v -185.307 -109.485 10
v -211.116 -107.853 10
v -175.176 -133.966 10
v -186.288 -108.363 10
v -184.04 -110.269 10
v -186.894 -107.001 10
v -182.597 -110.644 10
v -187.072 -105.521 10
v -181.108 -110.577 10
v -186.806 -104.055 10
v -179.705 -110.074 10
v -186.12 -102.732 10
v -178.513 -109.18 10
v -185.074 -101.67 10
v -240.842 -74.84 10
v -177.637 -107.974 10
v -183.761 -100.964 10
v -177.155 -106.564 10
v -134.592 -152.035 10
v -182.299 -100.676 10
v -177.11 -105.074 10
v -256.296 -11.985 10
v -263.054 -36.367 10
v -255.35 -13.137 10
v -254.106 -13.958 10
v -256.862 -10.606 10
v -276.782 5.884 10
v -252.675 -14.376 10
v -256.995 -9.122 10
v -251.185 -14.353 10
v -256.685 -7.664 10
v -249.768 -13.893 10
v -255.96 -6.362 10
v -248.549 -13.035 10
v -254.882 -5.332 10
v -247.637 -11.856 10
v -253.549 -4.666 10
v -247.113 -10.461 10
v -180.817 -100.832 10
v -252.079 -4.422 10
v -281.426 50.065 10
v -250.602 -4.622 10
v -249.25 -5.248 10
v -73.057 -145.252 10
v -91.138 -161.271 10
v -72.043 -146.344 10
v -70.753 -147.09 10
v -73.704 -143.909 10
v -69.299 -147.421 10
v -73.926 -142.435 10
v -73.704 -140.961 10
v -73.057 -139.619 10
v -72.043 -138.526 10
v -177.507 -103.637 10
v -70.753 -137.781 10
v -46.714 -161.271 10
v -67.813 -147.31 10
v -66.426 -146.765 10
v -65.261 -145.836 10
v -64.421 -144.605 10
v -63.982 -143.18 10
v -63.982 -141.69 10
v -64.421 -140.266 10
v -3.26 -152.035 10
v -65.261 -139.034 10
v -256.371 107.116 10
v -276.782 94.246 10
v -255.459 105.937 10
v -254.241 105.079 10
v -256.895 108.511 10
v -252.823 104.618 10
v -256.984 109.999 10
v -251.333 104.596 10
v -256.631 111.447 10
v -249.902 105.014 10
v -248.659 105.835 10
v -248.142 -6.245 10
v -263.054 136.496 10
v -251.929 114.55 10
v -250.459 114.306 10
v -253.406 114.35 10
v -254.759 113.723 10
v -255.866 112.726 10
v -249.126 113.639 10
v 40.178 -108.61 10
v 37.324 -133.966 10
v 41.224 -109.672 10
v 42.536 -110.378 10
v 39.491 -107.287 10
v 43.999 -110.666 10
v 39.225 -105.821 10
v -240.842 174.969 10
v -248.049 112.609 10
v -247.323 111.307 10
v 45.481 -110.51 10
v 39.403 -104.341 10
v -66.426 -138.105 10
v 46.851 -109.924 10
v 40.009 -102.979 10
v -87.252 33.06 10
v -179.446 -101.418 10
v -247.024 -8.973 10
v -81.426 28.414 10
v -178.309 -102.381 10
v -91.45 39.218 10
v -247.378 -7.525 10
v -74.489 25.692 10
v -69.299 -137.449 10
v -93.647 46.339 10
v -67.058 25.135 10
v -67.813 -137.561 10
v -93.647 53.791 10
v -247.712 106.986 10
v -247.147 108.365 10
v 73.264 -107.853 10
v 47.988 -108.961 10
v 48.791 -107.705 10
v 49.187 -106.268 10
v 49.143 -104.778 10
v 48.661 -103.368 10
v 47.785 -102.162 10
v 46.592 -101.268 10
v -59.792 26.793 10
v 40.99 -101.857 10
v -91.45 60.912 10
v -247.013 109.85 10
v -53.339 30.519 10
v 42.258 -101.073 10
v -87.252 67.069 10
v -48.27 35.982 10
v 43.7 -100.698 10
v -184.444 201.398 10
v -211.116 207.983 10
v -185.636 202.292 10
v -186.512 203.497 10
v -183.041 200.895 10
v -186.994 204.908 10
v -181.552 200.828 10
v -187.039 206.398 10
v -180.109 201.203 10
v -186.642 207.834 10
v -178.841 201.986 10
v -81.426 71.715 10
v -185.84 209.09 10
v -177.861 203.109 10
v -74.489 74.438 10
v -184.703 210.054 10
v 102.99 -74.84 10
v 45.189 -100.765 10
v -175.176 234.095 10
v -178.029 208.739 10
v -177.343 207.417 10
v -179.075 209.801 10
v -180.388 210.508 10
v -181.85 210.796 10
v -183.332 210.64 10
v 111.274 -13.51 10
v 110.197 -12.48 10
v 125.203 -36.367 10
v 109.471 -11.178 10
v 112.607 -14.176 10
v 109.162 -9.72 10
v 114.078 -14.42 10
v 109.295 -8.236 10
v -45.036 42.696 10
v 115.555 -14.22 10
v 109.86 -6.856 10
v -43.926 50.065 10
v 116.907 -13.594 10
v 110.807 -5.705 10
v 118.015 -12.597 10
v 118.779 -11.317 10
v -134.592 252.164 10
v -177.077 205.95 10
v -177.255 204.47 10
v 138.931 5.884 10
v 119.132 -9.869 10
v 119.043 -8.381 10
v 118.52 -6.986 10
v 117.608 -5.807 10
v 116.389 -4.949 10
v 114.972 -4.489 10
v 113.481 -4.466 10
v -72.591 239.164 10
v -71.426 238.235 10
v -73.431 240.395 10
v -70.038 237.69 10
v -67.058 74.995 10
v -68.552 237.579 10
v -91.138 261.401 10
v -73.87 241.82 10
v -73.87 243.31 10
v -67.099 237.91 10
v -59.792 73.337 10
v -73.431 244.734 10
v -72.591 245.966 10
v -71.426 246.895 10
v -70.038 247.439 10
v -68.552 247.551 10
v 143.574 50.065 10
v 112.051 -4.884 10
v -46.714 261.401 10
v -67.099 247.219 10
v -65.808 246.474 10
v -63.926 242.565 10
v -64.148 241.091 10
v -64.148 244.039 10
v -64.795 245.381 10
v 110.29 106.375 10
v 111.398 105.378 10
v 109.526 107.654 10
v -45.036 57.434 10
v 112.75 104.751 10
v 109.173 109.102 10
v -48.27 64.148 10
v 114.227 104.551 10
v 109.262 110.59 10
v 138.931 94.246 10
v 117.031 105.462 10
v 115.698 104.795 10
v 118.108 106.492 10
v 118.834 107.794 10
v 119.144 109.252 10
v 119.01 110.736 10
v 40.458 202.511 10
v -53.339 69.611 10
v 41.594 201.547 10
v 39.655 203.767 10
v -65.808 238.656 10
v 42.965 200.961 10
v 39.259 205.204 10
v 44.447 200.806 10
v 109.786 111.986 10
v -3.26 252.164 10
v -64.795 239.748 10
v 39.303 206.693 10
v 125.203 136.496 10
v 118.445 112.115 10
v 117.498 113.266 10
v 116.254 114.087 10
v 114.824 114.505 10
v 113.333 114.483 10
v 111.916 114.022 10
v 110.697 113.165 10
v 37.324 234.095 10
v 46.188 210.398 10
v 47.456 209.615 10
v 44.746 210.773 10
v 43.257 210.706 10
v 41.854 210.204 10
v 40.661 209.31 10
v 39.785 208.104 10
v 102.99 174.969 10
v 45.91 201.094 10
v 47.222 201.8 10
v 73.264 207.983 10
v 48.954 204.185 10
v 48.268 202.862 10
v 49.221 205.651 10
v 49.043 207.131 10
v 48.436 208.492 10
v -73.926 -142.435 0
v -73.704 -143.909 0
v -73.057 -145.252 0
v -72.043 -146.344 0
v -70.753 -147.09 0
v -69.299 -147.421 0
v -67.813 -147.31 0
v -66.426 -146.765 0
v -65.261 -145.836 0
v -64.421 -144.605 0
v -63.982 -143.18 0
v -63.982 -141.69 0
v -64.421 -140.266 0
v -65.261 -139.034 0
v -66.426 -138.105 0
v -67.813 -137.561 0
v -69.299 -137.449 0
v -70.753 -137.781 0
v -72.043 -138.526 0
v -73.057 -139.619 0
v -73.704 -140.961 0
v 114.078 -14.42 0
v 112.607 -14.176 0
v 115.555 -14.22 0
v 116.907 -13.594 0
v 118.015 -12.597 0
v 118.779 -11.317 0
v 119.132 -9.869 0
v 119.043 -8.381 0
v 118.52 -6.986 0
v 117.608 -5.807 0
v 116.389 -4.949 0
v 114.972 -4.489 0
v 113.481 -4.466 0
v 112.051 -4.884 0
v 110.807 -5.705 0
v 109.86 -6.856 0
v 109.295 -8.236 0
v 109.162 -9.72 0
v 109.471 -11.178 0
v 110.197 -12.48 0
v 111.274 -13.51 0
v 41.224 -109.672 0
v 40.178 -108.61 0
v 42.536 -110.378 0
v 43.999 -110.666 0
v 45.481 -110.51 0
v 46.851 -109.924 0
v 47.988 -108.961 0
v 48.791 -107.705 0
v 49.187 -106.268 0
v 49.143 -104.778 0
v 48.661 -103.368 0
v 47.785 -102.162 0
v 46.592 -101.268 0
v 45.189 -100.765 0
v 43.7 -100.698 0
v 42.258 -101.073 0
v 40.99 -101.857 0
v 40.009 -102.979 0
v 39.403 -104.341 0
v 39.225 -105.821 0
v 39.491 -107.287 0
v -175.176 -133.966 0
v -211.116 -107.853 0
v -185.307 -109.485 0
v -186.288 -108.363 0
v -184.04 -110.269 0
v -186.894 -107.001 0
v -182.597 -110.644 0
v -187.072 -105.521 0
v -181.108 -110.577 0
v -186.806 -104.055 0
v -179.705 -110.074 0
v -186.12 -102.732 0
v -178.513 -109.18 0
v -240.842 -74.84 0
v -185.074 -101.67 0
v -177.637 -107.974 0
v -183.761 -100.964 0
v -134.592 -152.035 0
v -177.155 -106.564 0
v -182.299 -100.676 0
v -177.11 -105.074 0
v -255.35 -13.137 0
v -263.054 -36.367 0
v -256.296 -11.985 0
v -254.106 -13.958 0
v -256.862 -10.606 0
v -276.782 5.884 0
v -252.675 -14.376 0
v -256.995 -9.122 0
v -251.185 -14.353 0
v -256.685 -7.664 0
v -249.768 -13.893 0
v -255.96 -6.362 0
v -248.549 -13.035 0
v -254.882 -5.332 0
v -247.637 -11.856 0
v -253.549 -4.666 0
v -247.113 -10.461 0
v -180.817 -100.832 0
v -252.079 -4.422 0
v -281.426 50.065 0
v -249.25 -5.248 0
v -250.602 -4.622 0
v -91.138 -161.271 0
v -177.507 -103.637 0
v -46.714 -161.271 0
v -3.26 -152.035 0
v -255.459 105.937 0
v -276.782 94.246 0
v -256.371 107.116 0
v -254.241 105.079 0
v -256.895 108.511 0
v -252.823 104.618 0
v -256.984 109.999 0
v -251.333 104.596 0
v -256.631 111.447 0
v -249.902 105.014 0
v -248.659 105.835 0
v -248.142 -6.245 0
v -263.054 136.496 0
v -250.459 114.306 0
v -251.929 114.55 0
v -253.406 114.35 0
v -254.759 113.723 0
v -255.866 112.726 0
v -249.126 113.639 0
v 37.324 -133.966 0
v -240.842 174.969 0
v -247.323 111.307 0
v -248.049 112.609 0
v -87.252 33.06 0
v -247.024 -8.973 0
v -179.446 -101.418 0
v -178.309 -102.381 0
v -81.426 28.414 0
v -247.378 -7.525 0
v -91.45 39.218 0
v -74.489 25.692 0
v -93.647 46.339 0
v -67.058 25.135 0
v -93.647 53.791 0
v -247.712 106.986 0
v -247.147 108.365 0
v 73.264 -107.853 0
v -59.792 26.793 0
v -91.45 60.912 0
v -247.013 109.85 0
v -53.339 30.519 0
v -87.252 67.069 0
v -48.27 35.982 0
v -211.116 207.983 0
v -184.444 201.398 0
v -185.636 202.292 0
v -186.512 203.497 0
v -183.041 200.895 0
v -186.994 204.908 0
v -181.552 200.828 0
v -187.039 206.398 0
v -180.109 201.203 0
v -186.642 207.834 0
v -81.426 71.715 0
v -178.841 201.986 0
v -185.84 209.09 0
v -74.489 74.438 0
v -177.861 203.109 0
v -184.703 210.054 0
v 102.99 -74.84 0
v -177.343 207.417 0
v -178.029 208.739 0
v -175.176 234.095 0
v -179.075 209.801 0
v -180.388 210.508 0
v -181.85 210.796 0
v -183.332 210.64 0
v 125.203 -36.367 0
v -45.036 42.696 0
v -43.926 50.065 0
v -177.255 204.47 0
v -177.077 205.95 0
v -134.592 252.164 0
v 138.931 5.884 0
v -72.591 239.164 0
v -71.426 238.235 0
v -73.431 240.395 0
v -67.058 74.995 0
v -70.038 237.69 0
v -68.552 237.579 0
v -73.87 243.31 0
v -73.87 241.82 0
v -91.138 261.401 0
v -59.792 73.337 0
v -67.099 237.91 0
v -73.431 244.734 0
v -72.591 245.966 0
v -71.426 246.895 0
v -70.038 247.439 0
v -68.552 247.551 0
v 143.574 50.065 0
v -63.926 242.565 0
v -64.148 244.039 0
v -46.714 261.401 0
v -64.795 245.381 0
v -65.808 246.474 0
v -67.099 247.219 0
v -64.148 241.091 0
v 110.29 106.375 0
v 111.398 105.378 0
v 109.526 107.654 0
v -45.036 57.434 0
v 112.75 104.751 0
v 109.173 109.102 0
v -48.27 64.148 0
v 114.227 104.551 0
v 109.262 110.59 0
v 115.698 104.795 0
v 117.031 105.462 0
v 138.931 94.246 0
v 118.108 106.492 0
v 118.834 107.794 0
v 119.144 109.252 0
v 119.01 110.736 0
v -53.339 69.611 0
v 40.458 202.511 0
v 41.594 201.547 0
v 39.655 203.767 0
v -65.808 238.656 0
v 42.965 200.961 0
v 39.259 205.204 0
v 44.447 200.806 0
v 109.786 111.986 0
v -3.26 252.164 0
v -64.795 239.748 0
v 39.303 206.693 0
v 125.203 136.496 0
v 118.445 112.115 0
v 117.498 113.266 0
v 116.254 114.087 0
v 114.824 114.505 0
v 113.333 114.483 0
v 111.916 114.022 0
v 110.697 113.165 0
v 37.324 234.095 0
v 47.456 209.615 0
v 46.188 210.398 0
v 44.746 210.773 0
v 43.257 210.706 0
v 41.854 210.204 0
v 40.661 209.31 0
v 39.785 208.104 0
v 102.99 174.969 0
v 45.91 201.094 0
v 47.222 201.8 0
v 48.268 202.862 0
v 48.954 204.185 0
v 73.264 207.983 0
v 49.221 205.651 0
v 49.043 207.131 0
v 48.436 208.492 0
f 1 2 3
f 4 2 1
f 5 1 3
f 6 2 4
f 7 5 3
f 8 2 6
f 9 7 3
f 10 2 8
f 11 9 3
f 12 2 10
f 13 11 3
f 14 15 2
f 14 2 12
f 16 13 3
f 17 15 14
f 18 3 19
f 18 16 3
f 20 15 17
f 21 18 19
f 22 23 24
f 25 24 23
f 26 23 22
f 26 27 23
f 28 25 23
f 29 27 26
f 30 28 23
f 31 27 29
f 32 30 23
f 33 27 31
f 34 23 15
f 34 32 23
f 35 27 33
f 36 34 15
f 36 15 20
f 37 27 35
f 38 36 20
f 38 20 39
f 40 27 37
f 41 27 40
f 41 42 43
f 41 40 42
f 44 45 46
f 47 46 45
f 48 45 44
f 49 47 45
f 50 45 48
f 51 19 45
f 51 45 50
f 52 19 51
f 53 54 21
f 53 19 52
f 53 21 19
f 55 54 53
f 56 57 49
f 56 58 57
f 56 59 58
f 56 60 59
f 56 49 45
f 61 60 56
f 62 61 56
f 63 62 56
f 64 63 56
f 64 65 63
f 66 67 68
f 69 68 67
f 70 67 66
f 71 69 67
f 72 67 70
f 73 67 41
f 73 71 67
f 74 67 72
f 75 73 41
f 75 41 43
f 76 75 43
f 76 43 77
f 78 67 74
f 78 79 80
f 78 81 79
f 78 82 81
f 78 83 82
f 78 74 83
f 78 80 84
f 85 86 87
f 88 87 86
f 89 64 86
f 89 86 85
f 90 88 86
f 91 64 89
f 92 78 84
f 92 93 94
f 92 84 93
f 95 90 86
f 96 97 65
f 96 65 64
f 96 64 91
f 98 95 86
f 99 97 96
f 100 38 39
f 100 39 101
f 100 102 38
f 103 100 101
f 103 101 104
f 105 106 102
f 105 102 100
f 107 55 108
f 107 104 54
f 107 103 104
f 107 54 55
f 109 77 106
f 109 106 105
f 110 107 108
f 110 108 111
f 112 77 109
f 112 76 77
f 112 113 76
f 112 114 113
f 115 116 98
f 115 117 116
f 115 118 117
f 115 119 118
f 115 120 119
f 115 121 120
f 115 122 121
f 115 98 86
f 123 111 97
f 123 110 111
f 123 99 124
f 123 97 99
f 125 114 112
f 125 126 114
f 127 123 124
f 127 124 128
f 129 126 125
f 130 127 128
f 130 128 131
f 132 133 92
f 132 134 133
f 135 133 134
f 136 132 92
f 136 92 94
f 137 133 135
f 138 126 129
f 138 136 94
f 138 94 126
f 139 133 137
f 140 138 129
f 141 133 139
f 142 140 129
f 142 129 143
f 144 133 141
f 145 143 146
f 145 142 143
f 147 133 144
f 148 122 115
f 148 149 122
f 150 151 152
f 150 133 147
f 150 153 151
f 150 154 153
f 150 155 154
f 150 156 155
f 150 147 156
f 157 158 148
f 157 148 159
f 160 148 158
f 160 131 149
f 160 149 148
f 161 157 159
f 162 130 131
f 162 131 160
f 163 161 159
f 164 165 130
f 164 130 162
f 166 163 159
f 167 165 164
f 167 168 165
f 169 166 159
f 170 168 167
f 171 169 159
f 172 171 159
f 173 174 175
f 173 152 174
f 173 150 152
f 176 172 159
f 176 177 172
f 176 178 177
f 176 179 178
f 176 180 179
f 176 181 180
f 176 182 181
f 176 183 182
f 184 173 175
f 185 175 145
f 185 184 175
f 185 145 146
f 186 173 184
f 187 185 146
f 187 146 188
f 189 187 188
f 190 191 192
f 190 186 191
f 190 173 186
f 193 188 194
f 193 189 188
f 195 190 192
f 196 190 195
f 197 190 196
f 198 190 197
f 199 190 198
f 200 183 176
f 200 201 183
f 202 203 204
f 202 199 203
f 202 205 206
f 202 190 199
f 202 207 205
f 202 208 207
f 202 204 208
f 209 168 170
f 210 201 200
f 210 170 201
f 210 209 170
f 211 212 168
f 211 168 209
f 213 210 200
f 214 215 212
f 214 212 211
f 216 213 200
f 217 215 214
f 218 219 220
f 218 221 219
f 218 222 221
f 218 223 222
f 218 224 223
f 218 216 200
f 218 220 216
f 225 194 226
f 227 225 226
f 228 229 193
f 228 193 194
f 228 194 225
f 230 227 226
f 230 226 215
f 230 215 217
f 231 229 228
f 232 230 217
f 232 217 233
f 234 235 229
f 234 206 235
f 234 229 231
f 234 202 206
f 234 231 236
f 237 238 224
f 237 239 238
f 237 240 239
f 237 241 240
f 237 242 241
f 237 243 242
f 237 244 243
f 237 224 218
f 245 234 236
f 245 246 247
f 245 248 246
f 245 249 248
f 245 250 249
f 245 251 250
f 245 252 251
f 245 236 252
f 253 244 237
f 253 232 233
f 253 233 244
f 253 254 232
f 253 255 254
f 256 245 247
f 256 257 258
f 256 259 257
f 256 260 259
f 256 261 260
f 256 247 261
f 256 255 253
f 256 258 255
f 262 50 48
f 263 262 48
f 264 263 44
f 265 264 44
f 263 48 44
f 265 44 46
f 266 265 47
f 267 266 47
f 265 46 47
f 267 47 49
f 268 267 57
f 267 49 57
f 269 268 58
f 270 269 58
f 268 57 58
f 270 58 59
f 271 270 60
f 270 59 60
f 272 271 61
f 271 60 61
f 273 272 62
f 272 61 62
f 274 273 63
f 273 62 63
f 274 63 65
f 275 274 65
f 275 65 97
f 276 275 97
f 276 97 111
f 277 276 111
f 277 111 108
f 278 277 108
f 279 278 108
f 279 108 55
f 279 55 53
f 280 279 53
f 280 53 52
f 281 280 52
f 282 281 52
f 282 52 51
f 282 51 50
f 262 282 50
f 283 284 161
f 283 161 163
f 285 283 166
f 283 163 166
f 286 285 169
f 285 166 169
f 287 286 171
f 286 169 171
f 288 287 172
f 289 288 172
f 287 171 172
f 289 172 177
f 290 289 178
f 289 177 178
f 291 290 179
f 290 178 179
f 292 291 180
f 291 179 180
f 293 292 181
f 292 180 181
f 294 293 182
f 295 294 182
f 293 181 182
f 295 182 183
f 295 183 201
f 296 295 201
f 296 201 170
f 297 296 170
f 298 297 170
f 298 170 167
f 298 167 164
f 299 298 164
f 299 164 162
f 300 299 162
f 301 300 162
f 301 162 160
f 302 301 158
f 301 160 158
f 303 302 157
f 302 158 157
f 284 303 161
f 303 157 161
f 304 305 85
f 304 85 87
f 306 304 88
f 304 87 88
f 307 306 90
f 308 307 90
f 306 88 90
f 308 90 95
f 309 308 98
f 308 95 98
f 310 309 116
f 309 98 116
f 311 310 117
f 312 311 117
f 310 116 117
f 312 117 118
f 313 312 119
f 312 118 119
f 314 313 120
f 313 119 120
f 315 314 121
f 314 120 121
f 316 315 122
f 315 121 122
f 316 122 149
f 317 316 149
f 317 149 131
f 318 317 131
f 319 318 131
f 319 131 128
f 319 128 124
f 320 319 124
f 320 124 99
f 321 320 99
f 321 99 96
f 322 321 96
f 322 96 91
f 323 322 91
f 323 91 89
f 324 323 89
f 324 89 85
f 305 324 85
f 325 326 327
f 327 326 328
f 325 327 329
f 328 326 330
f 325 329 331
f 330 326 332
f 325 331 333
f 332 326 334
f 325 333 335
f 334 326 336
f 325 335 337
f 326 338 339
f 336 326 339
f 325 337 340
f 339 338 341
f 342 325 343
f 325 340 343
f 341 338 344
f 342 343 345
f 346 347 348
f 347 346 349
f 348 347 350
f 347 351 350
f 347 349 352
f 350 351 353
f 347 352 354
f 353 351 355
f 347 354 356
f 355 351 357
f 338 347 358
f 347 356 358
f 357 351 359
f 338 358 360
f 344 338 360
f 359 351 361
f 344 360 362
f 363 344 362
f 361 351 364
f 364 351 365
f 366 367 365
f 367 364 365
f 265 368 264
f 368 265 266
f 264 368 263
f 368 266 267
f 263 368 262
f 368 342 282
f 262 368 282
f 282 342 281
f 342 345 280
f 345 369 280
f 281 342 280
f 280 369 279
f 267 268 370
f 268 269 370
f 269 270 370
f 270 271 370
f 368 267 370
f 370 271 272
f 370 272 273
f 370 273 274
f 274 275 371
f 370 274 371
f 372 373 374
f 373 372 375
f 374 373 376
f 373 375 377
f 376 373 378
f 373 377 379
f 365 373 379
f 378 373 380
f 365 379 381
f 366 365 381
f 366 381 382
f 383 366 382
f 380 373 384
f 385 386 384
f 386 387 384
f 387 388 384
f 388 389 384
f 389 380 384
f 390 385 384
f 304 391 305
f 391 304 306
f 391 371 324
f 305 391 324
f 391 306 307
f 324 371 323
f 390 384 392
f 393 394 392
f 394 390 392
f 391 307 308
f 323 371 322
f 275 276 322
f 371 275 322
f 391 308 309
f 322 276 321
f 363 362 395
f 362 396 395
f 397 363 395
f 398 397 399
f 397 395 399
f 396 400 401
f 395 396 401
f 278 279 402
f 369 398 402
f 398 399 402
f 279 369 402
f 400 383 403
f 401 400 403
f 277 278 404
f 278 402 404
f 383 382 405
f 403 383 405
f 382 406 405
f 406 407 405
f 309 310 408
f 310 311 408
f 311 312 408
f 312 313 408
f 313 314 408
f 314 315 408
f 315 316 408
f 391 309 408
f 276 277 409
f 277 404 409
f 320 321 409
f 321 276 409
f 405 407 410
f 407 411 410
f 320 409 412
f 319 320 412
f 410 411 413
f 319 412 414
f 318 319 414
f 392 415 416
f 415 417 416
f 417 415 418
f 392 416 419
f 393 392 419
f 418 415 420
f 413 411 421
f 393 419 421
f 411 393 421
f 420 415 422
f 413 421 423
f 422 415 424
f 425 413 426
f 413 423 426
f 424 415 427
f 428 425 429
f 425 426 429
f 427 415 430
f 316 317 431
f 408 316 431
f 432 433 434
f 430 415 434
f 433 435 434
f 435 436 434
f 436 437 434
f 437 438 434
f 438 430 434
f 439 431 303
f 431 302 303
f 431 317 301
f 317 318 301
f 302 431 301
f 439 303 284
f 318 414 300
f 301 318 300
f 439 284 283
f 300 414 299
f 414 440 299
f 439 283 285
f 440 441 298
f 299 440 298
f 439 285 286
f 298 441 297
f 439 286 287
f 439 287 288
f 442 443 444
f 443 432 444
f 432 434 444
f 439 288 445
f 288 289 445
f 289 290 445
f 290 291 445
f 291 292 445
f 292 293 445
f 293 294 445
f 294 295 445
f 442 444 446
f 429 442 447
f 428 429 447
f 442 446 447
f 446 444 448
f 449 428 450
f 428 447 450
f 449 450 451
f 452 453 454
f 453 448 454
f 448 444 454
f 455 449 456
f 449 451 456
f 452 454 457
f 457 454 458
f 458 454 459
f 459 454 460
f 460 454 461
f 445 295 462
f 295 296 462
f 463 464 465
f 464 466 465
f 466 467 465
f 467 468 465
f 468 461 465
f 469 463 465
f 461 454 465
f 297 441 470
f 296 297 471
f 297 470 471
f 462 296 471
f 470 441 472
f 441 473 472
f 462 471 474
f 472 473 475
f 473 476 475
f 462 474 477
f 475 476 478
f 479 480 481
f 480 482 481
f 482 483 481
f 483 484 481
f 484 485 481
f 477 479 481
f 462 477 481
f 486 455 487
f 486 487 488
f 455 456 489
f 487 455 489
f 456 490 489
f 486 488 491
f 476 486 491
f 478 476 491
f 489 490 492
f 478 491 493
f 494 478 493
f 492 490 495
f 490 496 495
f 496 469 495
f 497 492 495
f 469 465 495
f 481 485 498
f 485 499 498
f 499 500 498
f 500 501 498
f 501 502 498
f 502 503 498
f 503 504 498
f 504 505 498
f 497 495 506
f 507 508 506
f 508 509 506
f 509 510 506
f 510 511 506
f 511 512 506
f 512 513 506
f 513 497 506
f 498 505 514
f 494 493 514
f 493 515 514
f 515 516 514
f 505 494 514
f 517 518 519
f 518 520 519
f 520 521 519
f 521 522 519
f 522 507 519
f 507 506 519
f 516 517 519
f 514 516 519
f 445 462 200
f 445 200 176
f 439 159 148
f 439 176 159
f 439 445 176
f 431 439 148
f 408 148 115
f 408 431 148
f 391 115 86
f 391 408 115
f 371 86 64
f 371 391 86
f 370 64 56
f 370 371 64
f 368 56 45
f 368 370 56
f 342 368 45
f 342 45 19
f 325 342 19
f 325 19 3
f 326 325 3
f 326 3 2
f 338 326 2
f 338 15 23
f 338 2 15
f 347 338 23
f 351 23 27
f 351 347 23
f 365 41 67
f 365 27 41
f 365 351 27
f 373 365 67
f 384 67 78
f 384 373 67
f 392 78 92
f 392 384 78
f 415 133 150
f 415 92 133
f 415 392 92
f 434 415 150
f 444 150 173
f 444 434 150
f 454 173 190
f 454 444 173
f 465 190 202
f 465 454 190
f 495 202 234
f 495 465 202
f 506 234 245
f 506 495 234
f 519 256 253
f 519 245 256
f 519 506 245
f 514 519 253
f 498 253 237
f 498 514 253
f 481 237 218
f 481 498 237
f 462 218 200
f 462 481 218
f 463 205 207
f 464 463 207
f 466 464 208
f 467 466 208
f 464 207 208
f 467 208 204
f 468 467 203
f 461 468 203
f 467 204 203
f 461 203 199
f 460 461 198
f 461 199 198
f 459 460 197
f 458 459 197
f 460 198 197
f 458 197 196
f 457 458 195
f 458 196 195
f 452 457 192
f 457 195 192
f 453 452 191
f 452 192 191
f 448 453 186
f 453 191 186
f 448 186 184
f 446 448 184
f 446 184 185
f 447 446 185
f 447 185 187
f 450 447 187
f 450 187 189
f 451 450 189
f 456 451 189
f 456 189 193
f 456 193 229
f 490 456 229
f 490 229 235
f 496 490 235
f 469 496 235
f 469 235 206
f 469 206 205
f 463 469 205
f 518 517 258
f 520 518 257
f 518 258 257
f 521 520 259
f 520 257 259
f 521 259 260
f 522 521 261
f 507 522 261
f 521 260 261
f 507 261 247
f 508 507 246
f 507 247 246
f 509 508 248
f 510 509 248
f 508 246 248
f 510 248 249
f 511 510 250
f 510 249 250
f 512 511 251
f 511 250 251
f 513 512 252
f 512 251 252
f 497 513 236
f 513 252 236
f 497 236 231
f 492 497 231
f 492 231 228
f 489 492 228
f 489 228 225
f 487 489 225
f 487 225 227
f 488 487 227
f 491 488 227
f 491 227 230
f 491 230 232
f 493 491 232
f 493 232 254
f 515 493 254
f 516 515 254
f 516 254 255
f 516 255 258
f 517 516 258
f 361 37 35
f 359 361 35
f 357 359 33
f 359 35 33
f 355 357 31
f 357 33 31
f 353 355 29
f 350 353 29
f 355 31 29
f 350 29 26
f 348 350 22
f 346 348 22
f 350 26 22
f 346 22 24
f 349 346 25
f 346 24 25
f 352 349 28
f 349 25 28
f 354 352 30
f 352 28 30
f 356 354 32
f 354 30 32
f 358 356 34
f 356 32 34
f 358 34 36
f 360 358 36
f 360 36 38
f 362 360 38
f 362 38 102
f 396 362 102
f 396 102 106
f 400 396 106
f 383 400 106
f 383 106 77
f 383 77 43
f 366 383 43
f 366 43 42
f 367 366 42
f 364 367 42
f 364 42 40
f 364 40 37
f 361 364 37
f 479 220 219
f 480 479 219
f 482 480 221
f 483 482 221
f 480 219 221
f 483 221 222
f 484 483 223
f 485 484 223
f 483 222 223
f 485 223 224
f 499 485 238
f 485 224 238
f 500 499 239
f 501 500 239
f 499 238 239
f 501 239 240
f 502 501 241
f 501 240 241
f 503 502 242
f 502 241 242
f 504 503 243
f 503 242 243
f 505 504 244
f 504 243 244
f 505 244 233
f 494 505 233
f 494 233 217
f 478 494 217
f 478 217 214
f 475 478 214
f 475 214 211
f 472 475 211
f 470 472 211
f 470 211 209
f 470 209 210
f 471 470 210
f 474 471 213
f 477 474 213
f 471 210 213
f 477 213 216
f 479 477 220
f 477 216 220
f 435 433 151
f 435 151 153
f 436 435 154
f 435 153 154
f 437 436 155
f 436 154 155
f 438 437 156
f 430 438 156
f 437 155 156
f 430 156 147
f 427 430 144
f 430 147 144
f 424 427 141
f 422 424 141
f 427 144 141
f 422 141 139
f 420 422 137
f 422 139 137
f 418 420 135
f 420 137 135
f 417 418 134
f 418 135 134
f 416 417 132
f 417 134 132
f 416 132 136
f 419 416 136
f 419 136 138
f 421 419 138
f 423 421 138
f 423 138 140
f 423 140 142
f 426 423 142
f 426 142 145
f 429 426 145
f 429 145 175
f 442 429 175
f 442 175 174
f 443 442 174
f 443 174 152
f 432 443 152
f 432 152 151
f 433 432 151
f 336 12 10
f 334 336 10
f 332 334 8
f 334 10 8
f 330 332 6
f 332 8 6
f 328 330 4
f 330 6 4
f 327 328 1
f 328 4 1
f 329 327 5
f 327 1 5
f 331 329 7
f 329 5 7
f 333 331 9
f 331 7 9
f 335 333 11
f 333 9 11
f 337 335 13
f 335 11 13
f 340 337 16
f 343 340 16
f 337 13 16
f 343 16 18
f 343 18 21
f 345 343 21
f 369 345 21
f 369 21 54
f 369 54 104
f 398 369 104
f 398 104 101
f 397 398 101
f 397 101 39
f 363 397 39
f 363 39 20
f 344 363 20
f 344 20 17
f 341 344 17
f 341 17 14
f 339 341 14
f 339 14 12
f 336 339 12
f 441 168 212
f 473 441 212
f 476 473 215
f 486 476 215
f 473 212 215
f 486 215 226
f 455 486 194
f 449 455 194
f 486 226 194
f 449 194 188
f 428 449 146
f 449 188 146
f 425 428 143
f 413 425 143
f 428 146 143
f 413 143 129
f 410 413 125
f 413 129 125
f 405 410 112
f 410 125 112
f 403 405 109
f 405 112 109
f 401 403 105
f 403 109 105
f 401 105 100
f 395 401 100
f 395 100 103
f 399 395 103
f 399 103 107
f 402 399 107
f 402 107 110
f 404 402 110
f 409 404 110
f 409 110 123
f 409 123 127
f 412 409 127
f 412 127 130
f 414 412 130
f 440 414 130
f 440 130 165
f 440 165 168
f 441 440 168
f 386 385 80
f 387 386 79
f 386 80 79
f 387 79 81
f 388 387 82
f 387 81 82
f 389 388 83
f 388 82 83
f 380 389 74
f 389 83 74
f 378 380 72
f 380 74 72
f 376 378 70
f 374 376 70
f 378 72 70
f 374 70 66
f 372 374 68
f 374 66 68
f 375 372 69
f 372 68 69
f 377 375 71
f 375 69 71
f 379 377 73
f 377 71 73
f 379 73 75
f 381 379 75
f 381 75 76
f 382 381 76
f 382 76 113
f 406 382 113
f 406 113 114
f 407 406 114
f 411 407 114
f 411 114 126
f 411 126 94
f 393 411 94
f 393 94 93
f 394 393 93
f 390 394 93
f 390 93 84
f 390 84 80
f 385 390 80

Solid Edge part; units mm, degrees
sketch "Sketch1" plane through (0, 0, 0) normal (0, 0, 1) x (1, 0, 0)
  circle A0 centre (-68.9258, 50.0648) radius 212.5
  dimension "D1" = 425
extrude "Protrusion1" add sketch "Sketch1" along normal blind 10
sketch "Sketch2" plane through (-68.9258, 50.0648, 10) normal (0, 0, 1) x (1, 0, 0)
  circle A0 centre (0, 192.5) radius 5
  dimension "D1" = 10
  dimension "D2" = 20
extrude "Cutout1" cut sketch "Sketch2" against normal through all
pattern_circular "Pattern1" count 10 over 360 about axis through (-68.9258, 50.0648, 10) along (0, 0, -1) of "Cutout1"
sketch "Sketch3" plane through (-68.9258, 50.0648, 10) normal (0, 0, 1) x (1, 0, 0)
  circle A0 centre (0, 0) radius 25
  dimension "D1" = 50
extrude "Cutout2" cut sketch "Sketch3" against normal through all
